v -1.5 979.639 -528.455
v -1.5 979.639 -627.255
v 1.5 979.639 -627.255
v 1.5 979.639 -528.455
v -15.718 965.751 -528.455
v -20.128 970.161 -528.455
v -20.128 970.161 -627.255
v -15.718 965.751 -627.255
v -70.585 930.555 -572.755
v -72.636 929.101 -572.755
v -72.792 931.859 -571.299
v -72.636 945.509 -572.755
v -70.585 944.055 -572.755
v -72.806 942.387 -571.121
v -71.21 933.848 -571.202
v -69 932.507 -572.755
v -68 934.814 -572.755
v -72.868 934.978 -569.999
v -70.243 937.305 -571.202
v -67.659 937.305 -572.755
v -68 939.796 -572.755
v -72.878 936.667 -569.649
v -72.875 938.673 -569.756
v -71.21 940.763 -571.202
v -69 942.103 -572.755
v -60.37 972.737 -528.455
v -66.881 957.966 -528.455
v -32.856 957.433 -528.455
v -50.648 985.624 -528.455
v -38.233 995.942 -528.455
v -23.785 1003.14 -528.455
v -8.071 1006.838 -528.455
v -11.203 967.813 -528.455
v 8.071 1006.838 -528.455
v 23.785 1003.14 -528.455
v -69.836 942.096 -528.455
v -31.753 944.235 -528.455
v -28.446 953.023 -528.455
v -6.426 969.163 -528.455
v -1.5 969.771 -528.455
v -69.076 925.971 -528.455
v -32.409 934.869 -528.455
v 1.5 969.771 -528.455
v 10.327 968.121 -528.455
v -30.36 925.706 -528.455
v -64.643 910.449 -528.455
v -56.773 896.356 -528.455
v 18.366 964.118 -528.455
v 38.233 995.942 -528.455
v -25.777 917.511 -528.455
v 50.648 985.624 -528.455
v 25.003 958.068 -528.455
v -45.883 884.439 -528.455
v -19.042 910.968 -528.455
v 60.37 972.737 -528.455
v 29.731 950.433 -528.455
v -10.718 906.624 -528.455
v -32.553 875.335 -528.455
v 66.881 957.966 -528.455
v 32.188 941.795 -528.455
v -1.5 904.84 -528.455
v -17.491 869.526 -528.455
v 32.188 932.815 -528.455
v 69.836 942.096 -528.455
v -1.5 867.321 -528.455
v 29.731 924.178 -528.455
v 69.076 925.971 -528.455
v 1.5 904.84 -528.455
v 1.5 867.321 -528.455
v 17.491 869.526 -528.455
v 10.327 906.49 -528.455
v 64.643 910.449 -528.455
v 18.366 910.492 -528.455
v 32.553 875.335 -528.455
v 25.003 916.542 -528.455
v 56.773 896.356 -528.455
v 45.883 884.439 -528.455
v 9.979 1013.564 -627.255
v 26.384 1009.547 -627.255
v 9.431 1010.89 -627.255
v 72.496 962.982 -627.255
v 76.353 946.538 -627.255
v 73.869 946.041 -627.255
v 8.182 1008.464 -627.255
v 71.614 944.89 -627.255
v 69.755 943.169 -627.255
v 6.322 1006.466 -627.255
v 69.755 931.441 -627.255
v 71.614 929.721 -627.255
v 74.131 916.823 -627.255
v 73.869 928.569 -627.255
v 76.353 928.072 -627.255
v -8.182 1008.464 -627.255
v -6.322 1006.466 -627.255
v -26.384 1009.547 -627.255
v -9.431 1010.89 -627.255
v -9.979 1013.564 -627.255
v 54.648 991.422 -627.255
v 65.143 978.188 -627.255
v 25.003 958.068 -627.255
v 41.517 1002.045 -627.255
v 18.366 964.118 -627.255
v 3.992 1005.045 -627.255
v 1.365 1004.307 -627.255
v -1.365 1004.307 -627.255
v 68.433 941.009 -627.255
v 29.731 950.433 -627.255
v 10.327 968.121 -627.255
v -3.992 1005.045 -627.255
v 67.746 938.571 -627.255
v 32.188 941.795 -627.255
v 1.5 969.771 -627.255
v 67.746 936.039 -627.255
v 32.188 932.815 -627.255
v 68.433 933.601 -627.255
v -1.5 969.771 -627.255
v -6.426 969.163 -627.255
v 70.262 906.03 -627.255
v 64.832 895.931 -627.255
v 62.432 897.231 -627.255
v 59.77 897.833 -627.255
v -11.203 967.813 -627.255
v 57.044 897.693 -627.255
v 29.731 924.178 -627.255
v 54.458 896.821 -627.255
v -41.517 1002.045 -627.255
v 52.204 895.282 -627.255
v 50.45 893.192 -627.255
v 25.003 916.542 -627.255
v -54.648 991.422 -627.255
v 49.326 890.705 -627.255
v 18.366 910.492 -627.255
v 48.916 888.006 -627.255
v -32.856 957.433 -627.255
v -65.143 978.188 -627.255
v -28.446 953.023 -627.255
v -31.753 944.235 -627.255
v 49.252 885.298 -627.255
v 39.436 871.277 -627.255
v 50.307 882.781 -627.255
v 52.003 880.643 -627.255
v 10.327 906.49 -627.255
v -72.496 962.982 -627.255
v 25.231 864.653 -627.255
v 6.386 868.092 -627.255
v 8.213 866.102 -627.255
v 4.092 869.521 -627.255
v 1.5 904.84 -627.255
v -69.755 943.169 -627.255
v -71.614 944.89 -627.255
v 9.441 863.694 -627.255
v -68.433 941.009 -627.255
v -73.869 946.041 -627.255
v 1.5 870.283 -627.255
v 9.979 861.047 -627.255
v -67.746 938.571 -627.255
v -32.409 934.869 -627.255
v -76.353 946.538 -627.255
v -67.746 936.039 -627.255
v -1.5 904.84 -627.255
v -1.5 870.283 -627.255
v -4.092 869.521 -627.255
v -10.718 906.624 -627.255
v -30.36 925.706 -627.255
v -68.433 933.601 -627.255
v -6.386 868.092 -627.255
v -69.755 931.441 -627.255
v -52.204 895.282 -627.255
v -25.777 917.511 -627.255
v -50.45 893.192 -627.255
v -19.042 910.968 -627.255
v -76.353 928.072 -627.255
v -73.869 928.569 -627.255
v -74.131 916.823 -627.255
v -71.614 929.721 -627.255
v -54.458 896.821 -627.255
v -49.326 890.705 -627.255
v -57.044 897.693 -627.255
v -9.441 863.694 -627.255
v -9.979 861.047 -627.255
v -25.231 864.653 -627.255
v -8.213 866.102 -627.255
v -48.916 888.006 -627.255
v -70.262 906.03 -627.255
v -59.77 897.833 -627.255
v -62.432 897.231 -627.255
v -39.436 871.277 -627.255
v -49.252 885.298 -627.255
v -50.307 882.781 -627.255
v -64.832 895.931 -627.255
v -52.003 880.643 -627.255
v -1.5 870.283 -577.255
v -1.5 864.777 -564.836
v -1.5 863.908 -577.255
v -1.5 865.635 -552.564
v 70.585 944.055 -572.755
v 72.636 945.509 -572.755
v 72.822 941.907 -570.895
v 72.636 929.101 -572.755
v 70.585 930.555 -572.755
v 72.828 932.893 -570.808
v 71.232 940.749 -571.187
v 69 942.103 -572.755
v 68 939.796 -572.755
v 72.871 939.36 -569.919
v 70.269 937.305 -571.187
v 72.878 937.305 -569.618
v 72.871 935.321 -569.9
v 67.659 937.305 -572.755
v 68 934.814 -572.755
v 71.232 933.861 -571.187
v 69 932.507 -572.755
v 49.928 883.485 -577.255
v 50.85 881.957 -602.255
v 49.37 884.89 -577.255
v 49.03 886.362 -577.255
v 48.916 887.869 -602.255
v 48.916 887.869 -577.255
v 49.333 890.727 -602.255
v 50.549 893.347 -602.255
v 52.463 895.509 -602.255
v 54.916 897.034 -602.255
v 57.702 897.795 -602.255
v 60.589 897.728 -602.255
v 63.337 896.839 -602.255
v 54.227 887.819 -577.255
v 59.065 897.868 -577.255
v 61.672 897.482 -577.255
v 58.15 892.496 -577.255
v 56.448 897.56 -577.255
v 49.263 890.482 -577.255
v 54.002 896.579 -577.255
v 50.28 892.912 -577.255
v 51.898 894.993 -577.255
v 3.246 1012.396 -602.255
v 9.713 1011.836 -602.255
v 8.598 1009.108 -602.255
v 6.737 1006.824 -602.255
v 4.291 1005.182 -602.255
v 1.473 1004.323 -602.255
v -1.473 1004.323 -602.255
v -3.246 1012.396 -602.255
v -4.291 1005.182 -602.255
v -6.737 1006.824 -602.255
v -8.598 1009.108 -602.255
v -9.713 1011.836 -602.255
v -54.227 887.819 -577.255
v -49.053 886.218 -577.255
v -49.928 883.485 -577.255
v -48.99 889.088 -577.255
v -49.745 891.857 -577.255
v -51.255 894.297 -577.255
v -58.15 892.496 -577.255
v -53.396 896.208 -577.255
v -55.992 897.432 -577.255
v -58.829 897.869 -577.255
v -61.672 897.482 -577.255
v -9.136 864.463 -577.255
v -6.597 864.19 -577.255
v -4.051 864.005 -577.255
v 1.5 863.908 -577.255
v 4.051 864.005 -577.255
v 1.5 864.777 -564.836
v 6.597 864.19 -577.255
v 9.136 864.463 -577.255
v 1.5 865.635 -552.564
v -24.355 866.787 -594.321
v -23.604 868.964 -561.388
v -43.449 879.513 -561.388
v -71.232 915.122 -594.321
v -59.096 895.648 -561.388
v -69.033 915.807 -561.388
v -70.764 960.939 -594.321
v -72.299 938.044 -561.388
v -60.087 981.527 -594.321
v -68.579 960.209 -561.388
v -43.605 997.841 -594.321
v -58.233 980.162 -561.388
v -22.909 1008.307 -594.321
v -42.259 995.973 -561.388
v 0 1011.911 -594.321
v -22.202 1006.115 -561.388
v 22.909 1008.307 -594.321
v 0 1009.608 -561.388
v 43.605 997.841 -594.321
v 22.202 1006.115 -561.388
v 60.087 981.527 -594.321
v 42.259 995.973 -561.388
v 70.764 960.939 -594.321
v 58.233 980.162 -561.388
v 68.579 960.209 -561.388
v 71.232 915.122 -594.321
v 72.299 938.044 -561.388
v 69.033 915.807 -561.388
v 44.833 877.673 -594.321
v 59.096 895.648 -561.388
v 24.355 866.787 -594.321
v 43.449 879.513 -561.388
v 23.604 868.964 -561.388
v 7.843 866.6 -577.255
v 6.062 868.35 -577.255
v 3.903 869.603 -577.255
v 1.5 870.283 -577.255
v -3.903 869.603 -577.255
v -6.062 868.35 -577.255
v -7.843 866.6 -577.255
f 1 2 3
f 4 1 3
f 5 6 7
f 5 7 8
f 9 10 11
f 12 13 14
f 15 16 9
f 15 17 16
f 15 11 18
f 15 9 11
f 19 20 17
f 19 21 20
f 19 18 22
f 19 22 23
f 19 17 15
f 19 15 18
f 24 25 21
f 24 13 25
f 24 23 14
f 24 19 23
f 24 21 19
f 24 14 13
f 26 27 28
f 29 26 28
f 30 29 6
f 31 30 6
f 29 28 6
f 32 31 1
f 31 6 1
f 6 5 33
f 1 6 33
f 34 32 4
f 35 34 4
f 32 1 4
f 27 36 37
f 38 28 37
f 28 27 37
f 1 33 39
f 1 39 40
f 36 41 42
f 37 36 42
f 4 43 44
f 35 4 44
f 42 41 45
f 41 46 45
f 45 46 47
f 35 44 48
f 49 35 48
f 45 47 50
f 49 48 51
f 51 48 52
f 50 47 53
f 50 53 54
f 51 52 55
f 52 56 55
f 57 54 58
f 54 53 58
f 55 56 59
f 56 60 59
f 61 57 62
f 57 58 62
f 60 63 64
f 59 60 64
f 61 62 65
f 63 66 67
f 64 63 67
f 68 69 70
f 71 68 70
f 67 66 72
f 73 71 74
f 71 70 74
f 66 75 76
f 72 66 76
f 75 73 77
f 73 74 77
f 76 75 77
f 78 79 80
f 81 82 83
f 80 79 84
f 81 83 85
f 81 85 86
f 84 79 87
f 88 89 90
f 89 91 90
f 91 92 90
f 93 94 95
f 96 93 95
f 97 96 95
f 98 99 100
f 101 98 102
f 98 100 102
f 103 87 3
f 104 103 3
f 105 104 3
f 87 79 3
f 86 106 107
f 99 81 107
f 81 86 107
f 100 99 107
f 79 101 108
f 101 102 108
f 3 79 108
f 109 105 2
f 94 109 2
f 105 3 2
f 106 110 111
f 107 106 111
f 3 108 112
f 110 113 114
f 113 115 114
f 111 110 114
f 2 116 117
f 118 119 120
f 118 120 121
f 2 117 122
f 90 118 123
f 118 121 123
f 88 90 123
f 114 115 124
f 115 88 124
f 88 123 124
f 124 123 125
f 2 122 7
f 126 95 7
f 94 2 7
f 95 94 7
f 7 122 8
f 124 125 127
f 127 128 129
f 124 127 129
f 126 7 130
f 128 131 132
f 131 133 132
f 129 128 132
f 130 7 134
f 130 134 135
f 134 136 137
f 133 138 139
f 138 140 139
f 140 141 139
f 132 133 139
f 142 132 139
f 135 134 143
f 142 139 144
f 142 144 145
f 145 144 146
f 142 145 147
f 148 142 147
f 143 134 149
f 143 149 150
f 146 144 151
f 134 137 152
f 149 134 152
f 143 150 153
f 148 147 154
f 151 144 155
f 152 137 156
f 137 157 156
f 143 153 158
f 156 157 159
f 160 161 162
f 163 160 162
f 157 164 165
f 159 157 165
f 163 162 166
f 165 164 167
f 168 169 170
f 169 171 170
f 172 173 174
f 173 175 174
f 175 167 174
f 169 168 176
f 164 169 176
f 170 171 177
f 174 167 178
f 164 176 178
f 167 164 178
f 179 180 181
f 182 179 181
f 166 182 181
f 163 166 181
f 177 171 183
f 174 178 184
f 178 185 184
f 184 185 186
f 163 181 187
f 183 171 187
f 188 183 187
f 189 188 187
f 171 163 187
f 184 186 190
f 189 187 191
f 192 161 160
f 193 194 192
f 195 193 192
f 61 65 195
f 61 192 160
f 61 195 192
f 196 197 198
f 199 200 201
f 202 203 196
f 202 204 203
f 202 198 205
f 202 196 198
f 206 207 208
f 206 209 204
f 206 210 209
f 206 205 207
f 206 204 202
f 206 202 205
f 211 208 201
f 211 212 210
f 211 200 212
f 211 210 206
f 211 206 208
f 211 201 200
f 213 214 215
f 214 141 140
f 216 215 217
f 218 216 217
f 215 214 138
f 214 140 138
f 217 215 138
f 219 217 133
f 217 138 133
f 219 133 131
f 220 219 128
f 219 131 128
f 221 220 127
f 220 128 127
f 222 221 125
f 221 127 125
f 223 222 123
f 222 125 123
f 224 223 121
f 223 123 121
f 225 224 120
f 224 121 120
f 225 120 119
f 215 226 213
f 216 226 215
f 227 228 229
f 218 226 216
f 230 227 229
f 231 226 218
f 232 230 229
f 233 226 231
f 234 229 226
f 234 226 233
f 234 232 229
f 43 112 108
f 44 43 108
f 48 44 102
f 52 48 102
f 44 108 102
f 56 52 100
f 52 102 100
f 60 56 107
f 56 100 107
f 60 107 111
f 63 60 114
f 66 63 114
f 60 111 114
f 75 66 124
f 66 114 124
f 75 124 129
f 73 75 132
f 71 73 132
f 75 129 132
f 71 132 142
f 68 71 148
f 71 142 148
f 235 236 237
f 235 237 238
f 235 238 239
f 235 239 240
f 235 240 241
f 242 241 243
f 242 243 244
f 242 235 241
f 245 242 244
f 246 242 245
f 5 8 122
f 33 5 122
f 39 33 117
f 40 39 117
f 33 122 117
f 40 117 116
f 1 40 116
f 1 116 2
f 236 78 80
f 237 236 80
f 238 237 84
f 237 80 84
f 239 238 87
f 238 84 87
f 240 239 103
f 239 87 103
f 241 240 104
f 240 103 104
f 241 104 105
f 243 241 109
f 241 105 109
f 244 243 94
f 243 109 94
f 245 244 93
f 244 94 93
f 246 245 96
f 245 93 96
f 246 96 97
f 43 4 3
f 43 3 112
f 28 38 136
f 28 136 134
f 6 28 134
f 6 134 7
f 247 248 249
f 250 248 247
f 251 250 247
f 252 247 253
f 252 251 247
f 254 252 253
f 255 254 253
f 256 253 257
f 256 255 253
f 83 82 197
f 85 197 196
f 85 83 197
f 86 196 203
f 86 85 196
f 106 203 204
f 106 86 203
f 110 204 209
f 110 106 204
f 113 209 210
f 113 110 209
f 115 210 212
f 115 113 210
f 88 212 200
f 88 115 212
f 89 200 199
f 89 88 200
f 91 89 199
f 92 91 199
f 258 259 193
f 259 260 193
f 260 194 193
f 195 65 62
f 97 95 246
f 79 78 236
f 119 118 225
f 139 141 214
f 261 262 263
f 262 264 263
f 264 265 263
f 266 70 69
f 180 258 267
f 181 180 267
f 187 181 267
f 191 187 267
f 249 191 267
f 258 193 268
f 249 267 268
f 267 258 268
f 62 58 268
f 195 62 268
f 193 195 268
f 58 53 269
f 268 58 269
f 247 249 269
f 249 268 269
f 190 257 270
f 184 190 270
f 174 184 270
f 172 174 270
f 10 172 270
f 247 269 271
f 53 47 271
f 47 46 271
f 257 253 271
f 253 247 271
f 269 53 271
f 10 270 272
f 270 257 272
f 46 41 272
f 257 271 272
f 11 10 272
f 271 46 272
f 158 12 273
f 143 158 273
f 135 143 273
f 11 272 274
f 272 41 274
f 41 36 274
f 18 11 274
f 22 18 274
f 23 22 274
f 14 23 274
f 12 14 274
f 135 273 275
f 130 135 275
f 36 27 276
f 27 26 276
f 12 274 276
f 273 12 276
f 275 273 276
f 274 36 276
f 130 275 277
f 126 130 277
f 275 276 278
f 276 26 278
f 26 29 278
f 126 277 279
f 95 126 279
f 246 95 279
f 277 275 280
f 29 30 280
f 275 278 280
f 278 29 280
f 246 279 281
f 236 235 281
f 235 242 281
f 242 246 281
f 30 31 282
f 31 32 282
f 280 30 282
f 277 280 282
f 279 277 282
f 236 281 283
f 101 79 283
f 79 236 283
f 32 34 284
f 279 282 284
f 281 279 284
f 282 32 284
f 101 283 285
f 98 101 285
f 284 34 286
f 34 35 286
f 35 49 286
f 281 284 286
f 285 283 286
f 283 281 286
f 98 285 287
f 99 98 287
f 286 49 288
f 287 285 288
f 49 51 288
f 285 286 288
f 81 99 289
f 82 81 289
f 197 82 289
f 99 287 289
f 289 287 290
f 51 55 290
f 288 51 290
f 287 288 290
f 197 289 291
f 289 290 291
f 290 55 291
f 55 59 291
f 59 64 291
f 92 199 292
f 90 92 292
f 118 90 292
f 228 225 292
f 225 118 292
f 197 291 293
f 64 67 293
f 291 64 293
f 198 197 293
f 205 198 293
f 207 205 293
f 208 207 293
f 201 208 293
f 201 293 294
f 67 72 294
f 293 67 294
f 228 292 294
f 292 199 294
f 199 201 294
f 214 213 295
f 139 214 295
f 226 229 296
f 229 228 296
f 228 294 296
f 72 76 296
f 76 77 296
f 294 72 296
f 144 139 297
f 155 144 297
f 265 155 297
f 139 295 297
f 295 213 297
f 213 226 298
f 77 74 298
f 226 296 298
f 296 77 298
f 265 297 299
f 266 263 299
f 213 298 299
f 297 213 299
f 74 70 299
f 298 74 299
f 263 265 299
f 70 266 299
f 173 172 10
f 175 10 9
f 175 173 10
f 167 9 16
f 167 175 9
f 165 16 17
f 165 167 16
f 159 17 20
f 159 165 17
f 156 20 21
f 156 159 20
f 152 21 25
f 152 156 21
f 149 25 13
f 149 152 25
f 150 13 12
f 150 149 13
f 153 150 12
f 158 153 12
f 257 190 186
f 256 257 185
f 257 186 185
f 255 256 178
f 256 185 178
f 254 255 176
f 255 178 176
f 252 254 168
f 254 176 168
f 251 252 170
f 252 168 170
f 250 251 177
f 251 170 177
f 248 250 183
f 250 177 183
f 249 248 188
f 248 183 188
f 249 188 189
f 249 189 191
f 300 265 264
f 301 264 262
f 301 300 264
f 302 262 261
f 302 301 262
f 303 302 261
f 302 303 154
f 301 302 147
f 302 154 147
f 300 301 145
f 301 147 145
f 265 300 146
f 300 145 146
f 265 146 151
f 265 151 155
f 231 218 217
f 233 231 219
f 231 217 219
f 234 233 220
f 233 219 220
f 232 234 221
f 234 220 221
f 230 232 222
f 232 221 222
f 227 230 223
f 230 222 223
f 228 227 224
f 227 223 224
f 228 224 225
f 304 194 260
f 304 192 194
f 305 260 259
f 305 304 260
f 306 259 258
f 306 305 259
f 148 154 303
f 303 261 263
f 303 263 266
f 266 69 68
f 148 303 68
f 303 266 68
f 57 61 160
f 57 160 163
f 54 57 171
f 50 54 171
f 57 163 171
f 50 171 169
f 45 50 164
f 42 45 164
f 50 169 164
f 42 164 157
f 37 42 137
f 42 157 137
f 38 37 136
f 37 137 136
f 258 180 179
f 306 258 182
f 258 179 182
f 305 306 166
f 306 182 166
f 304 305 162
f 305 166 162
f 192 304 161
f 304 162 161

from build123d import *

# Parameters (mm, degrees)
CIRPATTERN1_COUNT       = 2
SKETCH7_R               = 10
CUT_EXTRUDE1_DEPTH      = 25
CIRPATTERN2_COUNT       = 2
CIRPATTERN2_ANGLE       = 130
SKETCH8_R               = 10
CUT_EXTRUDE2_DEPTH      = 50
CIRPATTERN3_COUNT       = 2
CIRPATTERN3_ANGLE       = 50
CUT_EXTRUDE3_DEPTH      = 1022.226122136
CUT_EXTRUDE3_DEPTH_BACK = 1022.226122136
SKETCH9_W               = 3
SKETCH9_H               = 87.216165293
CUT_EXTRUDE4_DEPTH      = 1022.226122136
CUT_EXTRUDE4_DEPTH_BACK = 1022.226122136
SKETCH12_R              = 10
CUT_EXTRUDE6_DEPTH      = 50
CUT_EXTRUDE7_DEPTH      = 1022.226122136
CUT_EXTRUDE7_DEPTH_BACK = 1022.226122136


with BuildPart() as part:
    # Sketch1 → Revolve1 (revolve)
    with BuildSketch(Plane(origin=(0, 0, 0), x_dir=(0, 0, -1), z_dir=(1, 0, 0)), mode=Mode.PRIVATE) as revolve1_sk:
        Polygon((627.254740219, 1014.21395543), (528.454740219, 1007.30518641), (528.454740219, 969.80518641), (532.567237031, 969.80518641), (611.238311694, 969.80518641), (627.254740219, 969.80518641), align=None)
    revolve(revolve1_sk.sketch.rotate(Axis((0, 937.30518641, -528.454740219), (0, 0, -1)), 90), axis=Axis((0, 937.30518641, -528.454740219), (0, 0, -1)))

    # Sketch6 → M20x1.5 Tapped Hole1 (revolve, cut)
    with BuildSketch(Plane(origin=(-76.90876902, 937.30518641, -627.254740219), x_dir=(0, 1, 0), z_dir=(1, 0, 0))):
        Polygon((0, 0), (0, 60.057960726), (9.25, 54.5), (9.25, 0), align=None)
    m20x1_5_tapped_hole1 = revolve(axis=Axis((-76.90876902, 937.30518641, -633.604740219), (0, 0, 1)), mode=Mode.SUBTRACT)

    # CirPattern1: M20x1.5 Tapped Hole1 ×2 about axis
    cirpattern1_axis = Axis((0, 937.30518641, 0), (0, 0, 1))
    for i in range(1, CIRPATTERN1_COUNT):
        add(m20x1_5_tapped_hole1.rotate(cirpattern1_axis, i * 360 / CIRPATTERN1_COUNT), mode=Mode.SUBTRACT)

    # Sketch7 → Cut-Extrude1 (cut)
    with BuildSketch(Plane(origin=(0, 0, -627.254740219), x_dir=(-1, 0, 0), z_dir=(0, 0, -1))):
        with Locations((0, 1014.21395543)):
            Circle(SKETCH7_R)
    cut_extrude1 = extrude(amount=-CUT_EXTRUDE1_DEPTH, mode=Mode.SUBTRACT)

    # CirPattern2: Cut-Extrude1 ×2 about axis
    cirpattern2_axis = Axis((0, 937.30518641, -627.254740219), (0, 0, -1))
    for i in range(1, CIRPATTERN2_COUNT):
        add(cut_extrude1.rotate(cirpattern2_axis, i * CIRPATTERN2_ANGLE / (CIRPATTERN2_COUNT - 1)), mode=Mode.SUBTRACT)

    # Sketch8 → Cut-Extrude2 (cut)
    with BuildSketch(Plane(origin=(0, 0, -627.254740219), x_dir=(-1, 0, 0), z_dir=(0, 0, -1))):
        with Locations((0, 860.39641739)):
            Circle(SKETCH8_R)
    cut_extrude2 = extrude(amount=-CUT_EXTRUDE2_DEPTH, mode=Mode.SUBTRACT)

    # CirPattern3: Cut-Extrude2 ×2 about axis
    cirpattern3_axis = Axis((0, 937.30518641, -627.254740219), (0, 0, -1))
    for i in range(1, CIRPATTERN3_COUNT):
        add(cut_extrude2.rotate(cirpattern3_axis, i * CIRPATTERN3_ANGLE / (CIRPATTERN3_COUNT - 1)), mode=Mode.SUBTRACT)

    # Sketch9 → Cut-Extrude3 (cut, two sides: drawn at the far end of the back side and taken through both)
    with BuildSketch(Plane(origin=(0, 0, -627.254740219), x_dir=(-1, 0, 0), z_dir=(0, 0, -1)).offset(-CUT_EXTRUDE3_DEPTH_BACK)):
        with Locations((0, 893.697103764)):
            Rectangle(SKETCH9_W, SKETCH9_H)
    extrude(amount=CUT_EXTRUDE3_DEPTH + CUT_EXTRUDE3_DEPTH_BACK, mode=Mode.SUBTRACT)

    # Sketch10 → Cut-Extrude4 (cut, two sides: drawn at the far end of the back side and taken through both)
    with BuildSketch(Plane(origin=(0, 0, -627.254740219), x_dir=(-1, 0, 0), z_dir=(0, 0, -1)).offset(-CUT_EXTRUDE4_DEPTH_BACK)):
        Polygon((1.5, 957.30518641), (1.5, 979.639325832), (-1.5, 979.639325832), (-1.5, 957.30518641), (-1.5, 953.730478501), (1.5, 953.730478501), align=None)
    extrude(amount=CUT_EXTRUDE4_DEPTH + CUT_EXTRUDE4_DEPTH_BACK, mode=Mode.SUBTRACT)

    # Sketch12 → Cut-Extrude6 (cut)
    with BuildSketch(Plane(origin=(0, 0, -627.254740219), x_dir=(-1, 0, 0), z_dir=(0, 0, -1))):
        with Locations((-58.915535135, 887.869182608)):
            Circle(SKETCH12_R)
    extrude(amount=-CUT_EXTRUDE6_DEPTH, mode=Mode.SUBTRACT)

    # Sketch13 → Cut-Extrude7 (cut, two sides: drawn at the far end of the back side and taken through both)
    with BuildSketch(Plane(origin=(0, 0, -627.254740219), x_dir=(-1, 0, 0), z_dir=(0, 0, -1)).offset(-CUT_EXTRUDE7_DEPTH_BACK)):
        Polygon((13.05698563, 963.090094101), (25.784907691, 950.36217204), (32.855975503, 957.433239852), (20.128053442, 970.161161913), align=None)
    extrude(amount=CUT_EXTRUDE7_DEPTH + CUT_EXTRUDE7_DEPTH_BACK, mode=Mode.SUBTRACT)


solid = part.part
